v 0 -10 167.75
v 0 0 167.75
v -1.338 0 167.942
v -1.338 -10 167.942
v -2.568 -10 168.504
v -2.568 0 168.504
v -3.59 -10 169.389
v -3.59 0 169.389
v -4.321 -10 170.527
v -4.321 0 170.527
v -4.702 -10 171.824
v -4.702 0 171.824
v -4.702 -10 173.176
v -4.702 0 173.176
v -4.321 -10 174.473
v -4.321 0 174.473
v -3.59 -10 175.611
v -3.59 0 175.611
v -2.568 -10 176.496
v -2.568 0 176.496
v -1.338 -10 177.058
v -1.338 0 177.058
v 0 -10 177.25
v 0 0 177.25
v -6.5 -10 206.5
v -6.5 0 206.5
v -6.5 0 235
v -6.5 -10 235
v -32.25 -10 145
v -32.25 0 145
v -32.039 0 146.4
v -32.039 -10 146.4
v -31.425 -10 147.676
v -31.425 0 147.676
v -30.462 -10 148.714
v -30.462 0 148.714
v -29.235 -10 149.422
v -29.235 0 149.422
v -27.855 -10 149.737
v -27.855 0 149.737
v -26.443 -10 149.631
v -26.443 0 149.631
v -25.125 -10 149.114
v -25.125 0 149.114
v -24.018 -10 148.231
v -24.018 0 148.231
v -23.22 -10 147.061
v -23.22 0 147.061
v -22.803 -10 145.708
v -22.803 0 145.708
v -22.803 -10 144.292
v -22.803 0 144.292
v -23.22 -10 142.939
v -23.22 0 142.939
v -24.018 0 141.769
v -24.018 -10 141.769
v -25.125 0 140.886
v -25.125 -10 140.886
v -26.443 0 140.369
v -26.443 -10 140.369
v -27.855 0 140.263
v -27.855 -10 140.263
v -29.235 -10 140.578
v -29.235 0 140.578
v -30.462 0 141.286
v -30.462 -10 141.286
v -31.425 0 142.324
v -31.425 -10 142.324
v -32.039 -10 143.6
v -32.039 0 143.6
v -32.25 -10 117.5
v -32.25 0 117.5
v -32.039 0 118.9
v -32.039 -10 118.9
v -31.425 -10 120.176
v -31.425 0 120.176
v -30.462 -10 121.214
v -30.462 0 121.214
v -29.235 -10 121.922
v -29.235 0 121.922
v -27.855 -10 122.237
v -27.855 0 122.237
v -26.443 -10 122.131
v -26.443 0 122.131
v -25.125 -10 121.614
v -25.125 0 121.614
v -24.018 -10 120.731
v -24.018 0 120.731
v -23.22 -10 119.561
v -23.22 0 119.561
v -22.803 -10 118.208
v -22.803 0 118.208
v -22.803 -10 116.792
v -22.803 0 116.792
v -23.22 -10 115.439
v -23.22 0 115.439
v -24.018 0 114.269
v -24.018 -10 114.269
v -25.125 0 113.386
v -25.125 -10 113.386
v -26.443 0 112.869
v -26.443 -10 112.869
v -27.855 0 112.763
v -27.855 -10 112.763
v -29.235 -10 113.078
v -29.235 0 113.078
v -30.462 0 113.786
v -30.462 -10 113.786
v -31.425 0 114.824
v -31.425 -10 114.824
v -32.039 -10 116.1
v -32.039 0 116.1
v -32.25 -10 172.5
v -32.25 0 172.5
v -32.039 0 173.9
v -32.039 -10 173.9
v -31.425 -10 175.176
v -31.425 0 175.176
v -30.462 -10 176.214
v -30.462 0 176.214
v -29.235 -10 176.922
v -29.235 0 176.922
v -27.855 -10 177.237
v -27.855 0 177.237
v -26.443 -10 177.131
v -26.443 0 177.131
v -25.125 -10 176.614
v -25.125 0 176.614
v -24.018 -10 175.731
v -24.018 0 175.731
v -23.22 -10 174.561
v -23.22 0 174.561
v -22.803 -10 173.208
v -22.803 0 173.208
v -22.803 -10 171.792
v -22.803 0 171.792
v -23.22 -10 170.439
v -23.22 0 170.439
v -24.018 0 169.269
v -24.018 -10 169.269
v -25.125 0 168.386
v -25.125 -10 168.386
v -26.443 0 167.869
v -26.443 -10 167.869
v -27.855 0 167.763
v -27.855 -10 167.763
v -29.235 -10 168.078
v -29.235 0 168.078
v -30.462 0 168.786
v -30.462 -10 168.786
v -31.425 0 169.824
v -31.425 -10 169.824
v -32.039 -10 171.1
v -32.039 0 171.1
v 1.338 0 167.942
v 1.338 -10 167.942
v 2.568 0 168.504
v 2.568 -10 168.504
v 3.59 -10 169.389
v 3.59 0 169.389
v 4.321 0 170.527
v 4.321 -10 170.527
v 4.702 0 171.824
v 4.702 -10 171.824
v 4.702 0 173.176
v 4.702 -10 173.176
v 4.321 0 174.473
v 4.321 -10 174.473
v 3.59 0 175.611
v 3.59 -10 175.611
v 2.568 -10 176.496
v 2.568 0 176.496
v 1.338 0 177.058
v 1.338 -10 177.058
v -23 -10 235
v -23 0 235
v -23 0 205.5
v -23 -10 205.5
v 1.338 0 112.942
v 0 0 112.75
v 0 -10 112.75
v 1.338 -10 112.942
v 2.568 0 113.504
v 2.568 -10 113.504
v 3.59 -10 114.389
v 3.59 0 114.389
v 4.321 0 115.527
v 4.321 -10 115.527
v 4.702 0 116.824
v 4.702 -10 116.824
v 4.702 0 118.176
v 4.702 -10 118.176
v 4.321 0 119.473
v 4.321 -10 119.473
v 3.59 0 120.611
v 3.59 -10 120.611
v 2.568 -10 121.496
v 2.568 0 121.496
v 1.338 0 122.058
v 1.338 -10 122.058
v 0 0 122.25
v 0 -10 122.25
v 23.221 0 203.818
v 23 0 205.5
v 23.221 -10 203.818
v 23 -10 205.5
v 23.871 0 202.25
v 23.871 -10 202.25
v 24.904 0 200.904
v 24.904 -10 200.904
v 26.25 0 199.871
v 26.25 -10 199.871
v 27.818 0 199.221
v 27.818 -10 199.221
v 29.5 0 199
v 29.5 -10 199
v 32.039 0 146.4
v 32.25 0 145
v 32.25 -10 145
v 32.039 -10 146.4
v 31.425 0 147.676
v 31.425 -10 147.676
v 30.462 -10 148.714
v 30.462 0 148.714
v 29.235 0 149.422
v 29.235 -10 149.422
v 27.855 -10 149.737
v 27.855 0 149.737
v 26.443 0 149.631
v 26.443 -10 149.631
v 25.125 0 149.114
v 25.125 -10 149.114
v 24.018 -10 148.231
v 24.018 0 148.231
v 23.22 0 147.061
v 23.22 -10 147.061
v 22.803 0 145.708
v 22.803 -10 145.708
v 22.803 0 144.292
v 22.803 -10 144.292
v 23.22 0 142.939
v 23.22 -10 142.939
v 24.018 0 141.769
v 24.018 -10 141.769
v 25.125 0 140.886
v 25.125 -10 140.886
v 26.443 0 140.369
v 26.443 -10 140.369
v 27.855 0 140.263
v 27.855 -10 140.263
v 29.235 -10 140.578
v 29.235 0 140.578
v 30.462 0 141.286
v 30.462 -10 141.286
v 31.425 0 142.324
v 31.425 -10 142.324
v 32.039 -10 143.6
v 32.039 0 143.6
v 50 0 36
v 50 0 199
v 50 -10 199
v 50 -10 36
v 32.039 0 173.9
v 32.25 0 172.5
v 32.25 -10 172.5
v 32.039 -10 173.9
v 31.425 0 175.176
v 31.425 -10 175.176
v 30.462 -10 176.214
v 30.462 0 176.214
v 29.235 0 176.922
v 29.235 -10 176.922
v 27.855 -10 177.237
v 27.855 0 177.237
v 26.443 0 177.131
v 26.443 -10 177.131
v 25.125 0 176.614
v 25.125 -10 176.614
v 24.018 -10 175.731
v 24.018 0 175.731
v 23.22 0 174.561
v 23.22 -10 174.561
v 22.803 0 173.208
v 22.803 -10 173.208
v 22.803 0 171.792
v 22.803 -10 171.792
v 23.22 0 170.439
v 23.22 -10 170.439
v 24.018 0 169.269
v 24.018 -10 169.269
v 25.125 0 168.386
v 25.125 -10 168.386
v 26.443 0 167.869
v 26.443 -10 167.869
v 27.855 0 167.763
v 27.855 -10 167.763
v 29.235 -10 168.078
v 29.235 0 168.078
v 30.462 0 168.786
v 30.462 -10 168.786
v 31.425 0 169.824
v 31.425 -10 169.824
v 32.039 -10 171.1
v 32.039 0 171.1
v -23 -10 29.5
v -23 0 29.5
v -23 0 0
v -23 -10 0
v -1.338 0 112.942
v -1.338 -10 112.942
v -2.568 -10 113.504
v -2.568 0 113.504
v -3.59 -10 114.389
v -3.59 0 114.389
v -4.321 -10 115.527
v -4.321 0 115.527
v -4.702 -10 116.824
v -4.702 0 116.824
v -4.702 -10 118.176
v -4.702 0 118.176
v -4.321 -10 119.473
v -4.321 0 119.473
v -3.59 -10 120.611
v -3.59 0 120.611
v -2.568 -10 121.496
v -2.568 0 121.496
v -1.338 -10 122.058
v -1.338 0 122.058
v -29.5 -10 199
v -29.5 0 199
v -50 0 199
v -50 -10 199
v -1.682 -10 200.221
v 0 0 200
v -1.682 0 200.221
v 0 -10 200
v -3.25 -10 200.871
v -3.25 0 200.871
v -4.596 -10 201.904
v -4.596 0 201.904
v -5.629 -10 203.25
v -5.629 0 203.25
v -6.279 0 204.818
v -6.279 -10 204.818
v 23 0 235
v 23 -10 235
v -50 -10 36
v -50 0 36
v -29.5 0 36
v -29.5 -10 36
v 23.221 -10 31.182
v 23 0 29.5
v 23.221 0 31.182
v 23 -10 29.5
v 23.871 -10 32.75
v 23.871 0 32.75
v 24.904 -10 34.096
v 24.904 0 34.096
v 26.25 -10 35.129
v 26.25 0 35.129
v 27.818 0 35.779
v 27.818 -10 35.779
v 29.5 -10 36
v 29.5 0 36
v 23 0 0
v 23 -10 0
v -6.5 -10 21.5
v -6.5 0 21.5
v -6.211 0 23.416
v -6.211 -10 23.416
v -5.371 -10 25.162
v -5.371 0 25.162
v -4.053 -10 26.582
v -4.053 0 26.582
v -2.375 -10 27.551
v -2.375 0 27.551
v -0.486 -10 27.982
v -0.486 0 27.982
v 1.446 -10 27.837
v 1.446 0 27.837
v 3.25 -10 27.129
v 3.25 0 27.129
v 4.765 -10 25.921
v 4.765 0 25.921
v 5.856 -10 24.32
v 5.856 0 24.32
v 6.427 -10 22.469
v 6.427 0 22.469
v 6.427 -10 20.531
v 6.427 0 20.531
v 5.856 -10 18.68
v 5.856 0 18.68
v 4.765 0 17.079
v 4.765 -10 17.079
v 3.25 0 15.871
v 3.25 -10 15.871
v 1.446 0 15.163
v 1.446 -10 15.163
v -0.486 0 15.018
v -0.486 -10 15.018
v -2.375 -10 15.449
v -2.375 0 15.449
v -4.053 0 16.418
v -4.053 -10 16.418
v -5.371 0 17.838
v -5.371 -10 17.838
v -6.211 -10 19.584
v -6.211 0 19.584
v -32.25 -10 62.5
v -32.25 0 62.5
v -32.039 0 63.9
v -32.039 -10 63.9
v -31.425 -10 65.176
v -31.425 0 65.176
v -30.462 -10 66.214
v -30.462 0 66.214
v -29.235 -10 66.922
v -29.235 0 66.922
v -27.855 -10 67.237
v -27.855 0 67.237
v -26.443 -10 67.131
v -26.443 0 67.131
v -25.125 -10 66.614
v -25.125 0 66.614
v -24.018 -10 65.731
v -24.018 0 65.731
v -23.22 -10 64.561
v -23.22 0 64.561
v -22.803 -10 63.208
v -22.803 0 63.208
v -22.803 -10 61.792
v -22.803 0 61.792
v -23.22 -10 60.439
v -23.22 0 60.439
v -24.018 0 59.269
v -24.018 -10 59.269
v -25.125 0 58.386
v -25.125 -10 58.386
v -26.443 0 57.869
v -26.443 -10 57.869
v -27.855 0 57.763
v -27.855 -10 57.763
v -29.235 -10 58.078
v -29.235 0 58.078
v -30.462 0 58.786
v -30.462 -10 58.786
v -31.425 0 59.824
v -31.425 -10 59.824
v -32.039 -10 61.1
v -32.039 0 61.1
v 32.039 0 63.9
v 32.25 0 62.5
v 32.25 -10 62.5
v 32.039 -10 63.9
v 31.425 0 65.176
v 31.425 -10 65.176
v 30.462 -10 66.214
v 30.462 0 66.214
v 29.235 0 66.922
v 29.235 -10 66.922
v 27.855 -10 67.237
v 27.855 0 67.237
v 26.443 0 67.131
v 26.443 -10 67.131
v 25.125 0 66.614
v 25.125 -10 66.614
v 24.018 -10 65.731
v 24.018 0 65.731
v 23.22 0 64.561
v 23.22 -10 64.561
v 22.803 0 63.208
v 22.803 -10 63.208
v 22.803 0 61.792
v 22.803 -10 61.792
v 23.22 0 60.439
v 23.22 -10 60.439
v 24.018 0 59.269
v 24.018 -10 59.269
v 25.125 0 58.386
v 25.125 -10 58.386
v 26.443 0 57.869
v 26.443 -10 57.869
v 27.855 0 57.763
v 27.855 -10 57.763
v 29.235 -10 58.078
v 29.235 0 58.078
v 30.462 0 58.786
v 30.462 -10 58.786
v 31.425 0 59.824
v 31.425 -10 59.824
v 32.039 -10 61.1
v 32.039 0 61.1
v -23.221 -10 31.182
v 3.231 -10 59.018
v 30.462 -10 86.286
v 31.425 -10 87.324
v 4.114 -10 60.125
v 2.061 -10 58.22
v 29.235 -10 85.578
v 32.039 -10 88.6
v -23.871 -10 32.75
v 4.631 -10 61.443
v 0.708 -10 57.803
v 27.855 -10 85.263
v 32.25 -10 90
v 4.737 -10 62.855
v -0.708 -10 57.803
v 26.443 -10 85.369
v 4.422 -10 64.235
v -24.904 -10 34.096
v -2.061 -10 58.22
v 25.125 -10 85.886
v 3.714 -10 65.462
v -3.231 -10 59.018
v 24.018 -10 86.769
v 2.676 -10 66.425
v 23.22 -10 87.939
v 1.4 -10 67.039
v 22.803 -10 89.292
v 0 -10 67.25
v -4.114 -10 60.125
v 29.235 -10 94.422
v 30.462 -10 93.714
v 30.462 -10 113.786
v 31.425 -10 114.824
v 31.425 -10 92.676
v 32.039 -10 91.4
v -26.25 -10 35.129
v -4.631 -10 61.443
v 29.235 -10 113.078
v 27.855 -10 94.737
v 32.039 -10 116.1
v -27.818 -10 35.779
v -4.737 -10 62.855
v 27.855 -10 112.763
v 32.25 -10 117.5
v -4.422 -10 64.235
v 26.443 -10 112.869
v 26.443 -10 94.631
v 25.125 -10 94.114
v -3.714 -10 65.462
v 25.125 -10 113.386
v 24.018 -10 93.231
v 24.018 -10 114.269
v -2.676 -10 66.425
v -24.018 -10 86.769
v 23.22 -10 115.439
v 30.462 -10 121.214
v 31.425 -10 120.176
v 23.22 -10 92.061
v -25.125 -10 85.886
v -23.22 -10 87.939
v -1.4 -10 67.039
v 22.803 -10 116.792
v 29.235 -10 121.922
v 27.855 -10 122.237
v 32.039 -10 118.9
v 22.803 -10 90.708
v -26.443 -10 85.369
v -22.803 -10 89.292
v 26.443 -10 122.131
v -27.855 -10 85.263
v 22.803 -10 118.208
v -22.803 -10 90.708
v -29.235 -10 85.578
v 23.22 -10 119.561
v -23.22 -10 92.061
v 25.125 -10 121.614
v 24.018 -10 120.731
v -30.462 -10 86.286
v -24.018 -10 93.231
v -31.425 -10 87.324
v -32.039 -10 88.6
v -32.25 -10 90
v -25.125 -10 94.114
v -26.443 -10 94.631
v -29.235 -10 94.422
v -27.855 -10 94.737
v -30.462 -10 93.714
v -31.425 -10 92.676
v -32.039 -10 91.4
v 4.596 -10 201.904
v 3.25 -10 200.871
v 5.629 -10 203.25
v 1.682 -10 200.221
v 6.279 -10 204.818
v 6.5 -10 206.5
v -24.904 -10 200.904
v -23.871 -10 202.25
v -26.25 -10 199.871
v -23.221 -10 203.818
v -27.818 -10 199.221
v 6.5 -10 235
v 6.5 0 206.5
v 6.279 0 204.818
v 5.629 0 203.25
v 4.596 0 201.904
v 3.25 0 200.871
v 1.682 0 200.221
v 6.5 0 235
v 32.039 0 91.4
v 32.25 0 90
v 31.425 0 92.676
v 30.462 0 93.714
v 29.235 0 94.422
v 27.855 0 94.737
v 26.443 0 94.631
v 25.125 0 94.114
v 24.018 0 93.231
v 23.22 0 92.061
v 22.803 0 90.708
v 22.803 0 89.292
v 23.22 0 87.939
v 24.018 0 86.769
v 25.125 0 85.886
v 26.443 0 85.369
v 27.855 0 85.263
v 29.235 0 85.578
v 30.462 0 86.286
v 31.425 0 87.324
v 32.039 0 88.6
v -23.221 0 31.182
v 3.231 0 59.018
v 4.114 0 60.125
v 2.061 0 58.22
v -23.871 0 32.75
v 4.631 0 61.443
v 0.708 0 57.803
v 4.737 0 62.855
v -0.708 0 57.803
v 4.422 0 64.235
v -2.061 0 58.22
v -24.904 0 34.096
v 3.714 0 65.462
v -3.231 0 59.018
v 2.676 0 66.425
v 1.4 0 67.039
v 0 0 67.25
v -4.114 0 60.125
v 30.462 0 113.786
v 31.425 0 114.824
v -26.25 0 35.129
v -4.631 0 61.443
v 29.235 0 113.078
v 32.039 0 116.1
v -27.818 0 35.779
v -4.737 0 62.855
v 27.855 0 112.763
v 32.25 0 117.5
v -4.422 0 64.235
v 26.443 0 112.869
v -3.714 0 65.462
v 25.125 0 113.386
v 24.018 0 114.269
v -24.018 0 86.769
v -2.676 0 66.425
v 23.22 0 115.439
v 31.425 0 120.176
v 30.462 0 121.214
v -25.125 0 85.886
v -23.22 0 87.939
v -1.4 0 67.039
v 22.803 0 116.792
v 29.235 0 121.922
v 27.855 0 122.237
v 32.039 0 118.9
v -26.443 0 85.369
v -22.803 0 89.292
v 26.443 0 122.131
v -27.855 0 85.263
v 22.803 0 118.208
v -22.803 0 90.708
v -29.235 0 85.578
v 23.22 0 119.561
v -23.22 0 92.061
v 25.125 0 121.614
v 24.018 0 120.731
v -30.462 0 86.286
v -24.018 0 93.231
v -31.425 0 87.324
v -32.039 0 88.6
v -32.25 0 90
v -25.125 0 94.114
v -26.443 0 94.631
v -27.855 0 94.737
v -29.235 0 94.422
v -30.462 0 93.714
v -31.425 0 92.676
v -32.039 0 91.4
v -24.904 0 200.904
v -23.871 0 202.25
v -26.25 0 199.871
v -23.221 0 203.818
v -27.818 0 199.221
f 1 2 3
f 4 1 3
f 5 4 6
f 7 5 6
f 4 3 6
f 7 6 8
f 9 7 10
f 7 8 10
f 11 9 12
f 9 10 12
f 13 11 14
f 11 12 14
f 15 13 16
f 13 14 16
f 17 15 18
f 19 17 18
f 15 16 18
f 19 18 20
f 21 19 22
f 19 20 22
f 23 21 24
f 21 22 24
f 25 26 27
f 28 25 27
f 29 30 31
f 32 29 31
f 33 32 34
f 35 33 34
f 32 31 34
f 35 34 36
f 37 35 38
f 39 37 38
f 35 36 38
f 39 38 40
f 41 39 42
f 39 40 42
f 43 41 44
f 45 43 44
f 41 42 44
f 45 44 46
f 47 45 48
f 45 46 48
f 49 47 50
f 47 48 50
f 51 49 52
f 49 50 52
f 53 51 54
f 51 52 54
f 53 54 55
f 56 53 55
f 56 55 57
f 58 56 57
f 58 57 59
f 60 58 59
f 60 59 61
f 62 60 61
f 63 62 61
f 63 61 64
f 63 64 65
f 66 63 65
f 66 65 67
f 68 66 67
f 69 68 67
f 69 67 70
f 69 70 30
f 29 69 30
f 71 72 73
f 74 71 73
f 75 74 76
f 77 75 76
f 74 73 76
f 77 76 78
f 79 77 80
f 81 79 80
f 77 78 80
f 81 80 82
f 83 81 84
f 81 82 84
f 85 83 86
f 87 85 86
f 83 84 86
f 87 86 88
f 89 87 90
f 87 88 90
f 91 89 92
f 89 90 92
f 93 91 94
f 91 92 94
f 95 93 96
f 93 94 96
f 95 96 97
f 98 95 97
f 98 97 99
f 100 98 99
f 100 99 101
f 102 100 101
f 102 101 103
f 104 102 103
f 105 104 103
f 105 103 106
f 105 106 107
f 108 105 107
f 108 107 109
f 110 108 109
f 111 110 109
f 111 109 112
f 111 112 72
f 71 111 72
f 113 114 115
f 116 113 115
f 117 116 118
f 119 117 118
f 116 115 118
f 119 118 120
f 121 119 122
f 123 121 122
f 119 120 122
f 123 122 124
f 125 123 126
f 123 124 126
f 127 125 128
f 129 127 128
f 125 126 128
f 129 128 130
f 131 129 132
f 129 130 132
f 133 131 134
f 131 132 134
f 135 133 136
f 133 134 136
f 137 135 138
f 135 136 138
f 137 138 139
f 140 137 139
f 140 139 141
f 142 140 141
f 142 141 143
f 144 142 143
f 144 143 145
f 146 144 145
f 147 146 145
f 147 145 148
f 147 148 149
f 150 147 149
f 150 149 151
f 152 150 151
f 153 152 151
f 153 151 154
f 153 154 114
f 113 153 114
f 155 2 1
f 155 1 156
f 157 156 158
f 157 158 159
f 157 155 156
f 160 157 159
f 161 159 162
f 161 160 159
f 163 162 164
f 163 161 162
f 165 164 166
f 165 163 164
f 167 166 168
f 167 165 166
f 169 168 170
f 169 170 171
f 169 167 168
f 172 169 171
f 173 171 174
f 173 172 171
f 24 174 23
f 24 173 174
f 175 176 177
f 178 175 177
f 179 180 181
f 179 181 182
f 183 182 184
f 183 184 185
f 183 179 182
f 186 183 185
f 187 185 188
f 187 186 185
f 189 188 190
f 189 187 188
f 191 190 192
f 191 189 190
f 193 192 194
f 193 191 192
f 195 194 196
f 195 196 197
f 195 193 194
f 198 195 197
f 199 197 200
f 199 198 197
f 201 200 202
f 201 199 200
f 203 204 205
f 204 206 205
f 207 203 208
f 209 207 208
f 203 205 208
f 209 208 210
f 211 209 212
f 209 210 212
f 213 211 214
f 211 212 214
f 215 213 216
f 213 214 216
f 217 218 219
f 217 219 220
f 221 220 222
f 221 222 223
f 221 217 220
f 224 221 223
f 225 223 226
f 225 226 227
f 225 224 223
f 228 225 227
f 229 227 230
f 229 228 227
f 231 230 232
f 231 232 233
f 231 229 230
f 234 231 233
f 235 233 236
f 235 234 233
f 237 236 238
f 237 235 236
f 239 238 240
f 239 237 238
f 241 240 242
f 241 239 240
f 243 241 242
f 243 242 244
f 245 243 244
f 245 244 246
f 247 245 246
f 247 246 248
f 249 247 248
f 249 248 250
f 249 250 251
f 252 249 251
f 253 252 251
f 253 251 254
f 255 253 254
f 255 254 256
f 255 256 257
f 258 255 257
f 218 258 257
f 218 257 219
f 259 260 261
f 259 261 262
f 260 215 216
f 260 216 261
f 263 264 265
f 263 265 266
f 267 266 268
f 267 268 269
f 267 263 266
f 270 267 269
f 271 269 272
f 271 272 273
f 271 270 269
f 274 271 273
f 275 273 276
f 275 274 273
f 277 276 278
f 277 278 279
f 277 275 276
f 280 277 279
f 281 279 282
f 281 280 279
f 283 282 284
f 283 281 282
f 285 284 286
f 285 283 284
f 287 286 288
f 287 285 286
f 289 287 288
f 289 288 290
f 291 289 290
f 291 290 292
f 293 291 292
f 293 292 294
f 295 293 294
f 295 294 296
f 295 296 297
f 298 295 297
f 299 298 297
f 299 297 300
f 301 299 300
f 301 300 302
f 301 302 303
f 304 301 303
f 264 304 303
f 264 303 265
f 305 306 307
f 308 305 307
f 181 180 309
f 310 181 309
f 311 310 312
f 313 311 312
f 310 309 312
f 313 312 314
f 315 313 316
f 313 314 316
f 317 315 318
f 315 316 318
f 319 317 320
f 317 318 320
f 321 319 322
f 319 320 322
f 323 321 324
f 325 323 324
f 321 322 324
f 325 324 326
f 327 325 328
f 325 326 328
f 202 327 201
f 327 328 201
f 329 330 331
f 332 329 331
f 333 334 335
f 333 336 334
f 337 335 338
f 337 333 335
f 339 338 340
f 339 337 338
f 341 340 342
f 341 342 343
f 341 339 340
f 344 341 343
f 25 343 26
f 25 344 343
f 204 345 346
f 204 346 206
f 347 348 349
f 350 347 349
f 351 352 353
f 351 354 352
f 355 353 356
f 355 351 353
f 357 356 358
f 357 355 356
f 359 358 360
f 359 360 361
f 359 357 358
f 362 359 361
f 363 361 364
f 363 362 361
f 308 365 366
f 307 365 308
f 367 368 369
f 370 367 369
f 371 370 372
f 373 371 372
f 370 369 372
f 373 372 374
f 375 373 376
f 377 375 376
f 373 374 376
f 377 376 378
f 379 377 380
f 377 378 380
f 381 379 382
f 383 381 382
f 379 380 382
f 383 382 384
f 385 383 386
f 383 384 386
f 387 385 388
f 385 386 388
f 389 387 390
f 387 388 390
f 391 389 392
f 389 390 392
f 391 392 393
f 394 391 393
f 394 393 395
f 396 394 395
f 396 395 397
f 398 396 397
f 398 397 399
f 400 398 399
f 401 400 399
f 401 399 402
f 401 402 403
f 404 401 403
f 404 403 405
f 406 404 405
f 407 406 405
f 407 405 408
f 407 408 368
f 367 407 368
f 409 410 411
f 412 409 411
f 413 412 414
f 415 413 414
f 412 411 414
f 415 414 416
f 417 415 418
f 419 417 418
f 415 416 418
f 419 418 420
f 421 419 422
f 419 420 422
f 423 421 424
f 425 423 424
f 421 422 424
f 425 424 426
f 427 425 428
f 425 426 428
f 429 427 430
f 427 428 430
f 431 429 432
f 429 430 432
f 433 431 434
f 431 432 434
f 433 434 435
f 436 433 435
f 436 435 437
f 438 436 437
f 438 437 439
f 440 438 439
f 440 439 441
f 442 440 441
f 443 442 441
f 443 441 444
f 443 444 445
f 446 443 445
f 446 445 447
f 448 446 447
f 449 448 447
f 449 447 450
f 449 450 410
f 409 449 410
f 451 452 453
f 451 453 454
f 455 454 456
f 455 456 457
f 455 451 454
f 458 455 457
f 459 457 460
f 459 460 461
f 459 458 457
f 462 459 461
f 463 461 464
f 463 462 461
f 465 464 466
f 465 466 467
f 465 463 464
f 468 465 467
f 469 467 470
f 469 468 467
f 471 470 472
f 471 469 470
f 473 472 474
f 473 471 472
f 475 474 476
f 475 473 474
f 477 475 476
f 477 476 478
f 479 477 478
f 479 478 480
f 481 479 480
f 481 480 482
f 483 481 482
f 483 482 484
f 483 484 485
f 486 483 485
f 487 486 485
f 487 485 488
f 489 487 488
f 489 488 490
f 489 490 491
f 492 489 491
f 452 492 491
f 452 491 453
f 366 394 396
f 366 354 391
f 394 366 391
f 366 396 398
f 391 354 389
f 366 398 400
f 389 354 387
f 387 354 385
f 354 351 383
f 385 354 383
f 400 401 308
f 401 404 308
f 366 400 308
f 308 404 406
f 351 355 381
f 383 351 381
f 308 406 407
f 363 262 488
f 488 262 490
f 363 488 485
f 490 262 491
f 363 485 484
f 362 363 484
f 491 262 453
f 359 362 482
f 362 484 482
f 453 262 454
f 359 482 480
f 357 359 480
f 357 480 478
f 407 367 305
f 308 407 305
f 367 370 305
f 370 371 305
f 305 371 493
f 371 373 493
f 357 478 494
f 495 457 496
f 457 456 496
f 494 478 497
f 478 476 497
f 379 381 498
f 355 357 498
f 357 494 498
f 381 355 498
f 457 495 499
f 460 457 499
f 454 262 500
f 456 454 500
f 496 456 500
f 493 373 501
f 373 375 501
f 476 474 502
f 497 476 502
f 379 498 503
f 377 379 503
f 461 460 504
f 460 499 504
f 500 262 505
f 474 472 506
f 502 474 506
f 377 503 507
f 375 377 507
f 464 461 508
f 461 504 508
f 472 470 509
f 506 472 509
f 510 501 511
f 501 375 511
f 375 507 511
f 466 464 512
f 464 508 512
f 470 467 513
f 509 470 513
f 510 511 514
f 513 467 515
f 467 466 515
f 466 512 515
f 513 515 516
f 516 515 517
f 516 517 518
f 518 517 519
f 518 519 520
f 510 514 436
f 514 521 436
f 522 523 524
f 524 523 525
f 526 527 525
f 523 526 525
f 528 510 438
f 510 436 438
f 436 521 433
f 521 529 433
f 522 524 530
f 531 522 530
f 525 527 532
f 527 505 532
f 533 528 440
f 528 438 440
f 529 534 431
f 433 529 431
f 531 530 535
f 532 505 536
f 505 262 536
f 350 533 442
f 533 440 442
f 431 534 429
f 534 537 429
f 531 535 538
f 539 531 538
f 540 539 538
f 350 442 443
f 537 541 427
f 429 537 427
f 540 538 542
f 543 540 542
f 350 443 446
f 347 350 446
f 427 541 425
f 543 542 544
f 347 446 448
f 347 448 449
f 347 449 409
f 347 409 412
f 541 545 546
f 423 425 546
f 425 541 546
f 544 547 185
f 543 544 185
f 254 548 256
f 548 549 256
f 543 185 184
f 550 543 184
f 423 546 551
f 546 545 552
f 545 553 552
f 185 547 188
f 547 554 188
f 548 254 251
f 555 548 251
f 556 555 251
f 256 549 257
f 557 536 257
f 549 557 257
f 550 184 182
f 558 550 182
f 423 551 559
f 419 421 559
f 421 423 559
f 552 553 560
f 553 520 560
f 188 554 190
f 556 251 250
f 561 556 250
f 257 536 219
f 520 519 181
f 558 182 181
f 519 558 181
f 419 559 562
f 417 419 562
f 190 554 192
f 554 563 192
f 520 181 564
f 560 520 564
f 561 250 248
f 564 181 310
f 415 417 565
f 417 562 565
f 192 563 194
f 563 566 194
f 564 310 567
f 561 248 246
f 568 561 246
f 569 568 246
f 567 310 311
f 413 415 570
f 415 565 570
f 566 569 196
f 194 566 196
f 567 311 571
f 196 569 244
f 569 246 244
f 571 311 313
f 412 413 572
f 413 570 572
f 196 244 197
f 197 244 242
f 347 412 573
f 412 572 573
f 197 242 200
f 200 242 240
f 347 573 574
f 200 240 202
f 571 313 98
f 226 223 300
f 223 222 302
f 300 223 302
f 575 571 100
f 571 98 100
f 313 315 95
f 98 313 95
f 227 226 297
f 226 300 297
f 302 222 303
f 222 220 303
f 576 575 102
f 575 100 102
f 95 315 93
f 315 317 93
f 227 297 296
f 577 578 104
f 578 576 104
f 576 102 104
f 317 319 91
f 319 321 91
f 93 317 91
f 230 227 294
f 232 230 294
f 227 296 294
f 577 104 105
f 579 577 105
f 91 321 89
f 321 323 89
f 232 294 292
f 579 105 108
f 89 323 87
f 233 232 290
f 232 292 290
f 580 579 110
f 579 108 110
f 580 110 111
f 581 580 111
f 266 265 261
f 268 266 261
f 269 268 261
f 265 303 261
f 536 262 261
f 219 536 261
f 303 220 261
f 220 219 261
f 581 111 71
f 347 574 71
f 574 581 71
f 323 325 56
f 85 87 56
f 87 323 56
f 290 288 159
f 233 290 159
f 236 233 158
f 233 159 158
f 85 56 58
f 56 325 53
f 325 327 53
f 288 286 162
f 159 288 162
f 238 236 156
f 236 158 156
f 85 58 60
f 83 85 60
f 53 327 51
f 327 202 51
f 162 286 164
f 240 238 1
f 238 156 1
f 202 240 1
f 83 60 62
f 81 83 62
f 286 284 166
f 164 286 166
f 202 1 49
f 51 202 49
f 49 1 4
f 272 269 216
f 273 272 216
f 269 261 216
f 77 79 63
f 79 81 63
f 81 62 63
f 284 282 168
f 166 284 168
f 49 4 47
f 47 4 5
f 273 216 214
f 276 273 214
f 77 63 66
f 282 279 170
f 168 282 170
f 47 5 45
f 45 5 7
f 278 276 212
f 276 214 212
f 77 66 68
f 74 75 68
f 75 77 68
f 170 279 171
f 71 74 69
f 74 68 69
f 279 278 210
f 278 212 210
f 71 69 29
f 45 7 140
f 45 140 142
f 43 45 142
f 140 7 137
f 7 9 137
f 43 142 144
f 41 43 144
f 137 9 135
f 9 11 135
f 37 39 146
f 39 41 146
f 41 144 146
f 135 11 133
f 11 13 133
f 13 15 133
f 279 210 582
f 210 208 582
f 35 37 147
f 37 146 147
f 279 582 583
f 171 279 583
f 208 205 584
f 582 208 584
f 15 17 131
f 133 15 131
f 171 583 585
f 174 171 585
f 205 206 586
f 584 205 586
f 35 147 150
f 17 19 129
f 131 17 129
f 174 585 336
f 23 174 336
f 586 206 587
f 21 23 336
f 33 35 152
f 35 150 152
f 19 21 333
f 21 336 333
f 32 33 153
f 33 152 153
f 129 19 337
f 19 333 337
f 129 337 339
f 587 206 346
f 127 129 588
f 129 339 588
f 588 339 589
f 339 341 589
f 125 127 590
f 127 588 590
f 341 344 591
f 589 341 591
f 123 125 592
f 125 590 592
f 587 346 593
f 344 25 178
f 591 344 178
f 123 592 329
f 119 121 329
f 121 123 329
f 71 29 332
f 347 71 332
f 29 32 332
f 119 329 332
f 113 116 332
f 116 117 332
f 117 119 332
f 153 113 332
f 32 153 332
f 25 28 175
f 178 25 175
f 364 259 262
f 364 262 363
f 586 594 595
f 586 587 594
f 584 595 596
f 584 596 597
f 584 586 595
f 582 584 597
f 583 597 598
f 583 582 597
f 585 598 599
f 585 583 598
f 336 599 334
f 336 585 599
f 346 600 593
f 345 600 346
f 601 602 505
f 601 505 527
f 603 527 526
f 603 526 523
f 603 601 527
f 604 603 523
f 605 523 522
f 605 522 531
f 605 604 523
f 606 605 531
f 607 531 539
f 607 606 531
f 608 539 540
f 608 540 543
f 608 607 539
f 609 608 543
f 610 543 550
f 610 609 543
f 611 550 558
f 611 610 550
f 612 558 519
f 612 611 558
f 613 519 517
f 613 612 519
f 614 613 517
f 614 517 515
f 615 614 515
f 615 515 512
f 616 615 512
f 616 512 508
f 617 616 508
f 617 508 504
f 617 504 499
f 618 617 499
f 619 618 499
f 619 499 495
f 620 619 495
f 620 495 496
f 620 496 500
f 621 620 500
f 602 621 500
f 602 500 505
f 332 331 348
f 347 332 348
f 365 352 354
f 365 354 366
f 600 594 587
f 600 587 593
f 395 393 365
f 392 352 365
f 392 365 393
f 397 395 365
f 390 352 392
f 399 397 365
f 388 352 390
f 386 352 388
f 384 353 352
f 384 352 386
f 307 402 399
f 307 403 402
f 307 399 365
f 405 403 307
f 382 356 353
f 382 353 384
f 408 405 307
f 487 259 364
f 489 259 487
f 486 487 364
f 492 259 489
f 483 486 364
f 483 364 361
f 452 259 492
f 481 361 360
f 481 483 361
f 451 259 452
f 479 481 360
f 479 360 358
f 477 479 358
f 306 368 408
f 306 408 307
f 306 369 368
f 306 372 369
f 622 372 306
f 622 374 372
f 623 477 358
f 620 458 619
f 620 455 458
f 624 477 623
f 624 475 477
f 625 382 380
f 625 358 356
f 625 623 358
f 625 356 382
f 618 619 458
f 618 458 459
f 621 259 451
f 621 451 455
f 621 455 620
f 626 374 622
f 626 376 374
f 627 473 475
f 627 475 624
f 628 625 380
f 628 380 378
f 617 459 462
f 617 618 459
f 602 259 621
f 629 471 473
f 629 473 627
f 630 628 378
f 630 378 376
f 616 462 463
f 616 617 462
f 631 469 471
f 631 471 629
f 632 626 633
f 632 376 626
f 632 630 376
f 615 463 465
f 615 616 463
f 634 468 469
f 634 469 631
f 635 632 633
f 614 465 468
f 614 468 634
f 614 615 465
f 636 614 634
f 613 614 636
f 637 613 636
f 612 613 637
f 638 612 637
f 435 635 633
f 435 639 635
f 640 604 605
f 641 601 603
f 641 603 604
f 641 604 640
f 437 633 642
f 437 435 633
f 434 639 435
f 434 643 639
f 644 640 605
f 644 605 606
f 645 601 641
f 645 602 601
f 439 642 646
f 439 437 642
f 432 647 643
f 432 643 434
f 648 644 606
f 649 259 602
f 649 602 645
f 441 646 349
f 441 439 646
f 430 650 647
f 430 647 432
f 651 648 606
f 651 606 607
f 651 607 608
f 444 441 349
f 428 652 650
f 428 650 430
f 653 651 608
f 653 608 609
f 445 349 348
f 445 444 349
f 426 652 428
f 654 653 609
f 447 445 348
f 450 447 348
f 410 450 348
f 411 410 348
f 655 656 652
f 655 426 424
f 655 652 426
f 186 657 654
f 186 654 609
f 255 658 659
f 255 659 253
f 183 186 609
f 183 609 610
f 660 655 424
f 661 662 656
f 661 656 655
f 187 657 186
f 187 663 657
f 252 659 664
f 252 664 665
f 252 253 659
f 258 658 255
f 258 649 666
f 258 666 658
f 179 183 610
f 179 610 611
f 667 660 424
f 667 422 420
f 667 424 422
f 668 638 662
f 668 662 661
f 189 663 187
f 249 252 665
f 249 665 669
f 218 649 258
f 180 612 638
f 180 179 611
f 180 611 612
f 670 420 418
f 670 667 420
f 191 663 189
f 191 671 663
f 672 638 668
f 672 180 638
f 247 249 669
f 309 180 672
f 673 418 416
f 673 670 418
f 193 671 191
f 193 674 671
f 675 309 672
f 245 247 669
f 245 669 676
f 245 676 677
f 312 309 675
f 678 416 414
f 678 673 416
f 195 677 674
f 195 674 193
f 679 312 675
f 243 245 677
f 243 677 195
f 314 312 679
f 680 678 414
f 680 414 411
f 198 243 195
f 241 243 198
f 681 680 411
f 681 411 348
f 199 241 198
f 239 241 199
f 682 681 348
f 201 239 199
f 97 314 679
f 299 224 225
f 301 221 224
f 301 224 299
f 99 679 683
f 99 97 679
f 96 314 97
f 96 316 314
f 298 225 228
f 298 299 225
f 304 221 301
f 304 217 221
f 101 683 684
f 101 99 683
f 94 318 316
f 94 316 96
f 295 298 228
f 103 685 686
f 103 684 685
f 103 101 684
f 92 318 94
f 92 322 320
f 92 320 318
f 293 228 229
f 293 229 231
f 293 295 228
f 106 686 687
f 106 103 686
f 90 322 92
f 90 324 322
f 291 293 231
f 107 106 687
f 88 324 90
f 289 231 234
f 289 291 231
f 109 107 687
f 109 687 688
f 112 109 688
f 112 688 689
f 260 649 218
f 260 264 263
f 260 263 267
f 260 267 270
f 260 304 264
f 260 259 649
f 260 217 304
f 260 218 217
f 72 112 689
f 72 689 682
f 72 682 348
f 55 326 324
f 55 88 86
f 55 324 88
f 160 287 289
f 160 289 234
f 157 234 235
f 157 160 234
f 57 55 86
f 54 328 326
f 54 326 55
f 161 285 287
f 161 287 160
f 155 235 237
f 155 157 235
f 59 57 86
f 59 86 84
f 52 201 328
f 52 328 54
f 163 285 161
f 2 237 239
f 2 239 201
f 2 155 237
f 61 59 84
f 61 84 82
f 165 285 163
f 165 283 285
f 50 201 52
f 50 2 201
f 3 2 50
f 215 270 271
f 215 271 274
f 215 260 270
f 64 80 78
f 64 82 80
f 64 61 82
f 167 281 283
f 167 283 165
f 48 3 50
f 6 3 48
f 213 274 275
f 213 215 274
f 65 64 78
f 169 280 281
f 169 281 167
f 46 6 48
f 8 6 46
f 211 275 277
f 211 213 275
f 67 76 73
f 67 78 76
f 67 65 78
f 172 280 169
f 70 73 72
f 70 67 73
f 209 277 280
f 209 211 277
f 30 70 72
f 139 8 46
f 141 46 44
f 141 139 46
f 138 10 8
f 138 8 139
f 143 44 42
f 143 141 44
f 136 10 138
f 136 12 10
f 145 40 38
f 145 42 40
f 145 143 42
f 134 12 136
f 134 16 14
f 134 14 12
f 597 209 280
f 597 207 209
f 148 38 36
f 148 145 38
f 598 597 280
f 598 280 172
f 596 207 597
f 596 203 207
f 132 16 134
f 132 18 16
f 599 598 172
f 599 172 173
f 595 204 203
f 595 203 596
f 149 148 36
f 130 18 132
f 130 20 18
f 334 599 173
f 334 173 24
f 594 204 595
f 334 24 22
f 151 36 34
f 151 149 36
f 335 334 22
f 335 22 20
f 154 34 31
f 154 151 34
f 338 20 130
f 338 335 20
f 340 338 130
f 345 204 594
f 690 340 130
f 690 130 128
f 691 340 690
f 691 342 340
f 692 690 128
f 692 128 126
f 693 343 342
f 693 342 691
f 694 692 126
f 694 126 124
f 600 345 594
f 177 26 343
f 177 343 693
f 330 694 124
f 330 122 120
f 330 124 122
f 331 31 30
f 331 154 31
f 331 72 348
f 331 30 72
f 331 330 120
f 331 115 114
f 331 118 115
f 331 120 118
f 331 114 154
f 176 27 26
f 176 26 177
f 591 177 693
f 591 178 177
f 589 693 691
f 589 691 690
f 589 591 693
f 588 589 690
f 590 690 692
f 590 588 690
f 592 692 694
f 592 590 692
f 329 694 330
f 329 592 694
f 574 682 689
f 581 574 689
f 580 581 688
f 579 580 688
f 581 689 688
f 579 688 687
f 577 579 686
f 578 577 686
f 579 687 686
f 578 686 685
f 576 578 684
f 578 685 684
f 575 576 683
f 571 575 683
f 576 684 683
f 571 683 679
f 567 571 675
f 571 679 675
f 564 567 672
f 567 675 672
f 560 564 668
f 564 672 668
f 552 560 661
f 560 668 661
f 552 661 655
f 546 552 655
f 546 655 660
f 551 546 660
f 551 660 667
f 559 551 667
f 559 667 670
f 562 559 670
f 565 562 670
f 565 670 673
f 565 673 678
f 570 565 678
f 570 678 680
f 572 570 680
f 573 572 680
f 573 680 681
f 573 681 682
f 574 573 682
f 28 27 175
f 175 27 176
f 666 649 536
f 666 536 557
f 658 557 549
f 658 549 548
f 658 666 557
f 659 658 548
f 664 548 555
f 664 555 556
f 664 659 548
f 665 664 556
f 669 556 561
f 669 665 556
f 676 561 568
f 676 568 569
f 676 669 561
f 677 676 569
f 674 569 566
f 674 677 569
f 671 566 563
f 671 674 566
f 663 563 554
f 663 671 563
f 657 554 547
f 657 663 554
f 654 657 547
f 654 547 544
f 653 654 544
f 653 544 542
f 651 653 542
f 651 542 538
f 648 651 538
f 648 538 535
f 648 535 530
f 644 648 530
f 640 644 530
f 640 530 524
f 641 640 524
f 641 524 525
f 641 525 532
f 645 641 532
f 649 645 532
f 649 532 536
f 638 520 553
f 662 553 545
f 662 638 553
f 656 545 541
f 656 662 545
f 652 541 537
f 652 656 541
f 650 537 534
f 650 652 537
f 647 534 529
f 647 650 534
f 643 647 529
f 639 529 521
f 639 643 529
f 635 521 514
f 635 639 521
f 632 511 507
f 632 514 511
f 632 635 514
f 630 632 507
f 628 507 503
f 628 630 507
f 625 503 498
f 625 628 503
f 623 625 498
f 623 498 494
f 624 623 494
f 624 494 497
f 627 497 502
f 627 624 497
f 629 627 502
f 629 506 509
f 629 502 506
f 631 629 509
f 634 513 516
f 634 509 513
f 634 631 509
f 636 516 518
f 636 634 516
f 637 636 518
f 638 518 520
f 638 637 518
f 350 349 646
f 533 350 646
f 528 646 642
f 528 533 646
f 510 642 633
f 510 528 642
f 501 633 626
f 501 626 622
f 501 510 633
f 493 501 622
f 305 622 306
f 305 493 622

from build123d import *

# Parameters (mm, degrees)
F1_DEPTH = 10
F3_D     = 9.5
F7_D     = 13
F8_R     = 6.49999
F9_R     = 6.5


# Not quite as in the source:
# - a fillet or chamfer is up to 0.001 mm smaller than in the source, because OpenCascade refuses the exact size


with BuildPart() as f1:
    # F0 (on Front) → F1 (new body)
    with BuildSketch(Plane.XZ):
        Polygon((-23, 0), (0, 0), (0, 200), (-6.5, 200), (-6.5, 235), (-23, 235), (-23, 199), (-50, 199), (-50, 36), (-23, 36), align=None)
    extrude(amount=F1_DEPTH)

    # F3 (through all)
    with Locations(Plane.XZ.offset(10)):
        with Locations((-27.5, 172.5), (-27.5, 145), (-27.5, 117.5), (-27.5, 90), (-27.5, 62.5), (0, 62.5), (0, 117.5), (0, 172.5)):
            Hole(F3_D / 2)

    # F4: F1 across face


with BuildPart() as f1_1:
    add(f1.part)
    add(f1.part.mirror(Plane(origin=(0, -5, 90), x_dir=(0, 1, 0), z_dir=(1, 0, 0))))

    # F7 (through all)
    with Locations(Plane.XZ.offset(10)):
        with Locations((0, 21.5)):
            Hole(F7_D / 2)

    # F8 (radius 6.5 in the source; OpenCascade refuses exactly that, so slightly less here)
    f8_edges = [f1_1.edges().sort_by_distance(p)[0] for p in [
        (-6.5, -5, 200),
        (6.5, -5, 200),
    ]]
    fillet(f8_edges, radius=F8_R)

    # F9
    f9_edges = [f1_1.edges().sort_by_distance(p)[0] for p in [
        (23, -5, 199),
        (-23, -5, 199),
        (23, -5, 36),
        (-23, -5, 36),
    ]]
    fillet(f9_edges, radius=F9_R)


solid = f1_1.part
